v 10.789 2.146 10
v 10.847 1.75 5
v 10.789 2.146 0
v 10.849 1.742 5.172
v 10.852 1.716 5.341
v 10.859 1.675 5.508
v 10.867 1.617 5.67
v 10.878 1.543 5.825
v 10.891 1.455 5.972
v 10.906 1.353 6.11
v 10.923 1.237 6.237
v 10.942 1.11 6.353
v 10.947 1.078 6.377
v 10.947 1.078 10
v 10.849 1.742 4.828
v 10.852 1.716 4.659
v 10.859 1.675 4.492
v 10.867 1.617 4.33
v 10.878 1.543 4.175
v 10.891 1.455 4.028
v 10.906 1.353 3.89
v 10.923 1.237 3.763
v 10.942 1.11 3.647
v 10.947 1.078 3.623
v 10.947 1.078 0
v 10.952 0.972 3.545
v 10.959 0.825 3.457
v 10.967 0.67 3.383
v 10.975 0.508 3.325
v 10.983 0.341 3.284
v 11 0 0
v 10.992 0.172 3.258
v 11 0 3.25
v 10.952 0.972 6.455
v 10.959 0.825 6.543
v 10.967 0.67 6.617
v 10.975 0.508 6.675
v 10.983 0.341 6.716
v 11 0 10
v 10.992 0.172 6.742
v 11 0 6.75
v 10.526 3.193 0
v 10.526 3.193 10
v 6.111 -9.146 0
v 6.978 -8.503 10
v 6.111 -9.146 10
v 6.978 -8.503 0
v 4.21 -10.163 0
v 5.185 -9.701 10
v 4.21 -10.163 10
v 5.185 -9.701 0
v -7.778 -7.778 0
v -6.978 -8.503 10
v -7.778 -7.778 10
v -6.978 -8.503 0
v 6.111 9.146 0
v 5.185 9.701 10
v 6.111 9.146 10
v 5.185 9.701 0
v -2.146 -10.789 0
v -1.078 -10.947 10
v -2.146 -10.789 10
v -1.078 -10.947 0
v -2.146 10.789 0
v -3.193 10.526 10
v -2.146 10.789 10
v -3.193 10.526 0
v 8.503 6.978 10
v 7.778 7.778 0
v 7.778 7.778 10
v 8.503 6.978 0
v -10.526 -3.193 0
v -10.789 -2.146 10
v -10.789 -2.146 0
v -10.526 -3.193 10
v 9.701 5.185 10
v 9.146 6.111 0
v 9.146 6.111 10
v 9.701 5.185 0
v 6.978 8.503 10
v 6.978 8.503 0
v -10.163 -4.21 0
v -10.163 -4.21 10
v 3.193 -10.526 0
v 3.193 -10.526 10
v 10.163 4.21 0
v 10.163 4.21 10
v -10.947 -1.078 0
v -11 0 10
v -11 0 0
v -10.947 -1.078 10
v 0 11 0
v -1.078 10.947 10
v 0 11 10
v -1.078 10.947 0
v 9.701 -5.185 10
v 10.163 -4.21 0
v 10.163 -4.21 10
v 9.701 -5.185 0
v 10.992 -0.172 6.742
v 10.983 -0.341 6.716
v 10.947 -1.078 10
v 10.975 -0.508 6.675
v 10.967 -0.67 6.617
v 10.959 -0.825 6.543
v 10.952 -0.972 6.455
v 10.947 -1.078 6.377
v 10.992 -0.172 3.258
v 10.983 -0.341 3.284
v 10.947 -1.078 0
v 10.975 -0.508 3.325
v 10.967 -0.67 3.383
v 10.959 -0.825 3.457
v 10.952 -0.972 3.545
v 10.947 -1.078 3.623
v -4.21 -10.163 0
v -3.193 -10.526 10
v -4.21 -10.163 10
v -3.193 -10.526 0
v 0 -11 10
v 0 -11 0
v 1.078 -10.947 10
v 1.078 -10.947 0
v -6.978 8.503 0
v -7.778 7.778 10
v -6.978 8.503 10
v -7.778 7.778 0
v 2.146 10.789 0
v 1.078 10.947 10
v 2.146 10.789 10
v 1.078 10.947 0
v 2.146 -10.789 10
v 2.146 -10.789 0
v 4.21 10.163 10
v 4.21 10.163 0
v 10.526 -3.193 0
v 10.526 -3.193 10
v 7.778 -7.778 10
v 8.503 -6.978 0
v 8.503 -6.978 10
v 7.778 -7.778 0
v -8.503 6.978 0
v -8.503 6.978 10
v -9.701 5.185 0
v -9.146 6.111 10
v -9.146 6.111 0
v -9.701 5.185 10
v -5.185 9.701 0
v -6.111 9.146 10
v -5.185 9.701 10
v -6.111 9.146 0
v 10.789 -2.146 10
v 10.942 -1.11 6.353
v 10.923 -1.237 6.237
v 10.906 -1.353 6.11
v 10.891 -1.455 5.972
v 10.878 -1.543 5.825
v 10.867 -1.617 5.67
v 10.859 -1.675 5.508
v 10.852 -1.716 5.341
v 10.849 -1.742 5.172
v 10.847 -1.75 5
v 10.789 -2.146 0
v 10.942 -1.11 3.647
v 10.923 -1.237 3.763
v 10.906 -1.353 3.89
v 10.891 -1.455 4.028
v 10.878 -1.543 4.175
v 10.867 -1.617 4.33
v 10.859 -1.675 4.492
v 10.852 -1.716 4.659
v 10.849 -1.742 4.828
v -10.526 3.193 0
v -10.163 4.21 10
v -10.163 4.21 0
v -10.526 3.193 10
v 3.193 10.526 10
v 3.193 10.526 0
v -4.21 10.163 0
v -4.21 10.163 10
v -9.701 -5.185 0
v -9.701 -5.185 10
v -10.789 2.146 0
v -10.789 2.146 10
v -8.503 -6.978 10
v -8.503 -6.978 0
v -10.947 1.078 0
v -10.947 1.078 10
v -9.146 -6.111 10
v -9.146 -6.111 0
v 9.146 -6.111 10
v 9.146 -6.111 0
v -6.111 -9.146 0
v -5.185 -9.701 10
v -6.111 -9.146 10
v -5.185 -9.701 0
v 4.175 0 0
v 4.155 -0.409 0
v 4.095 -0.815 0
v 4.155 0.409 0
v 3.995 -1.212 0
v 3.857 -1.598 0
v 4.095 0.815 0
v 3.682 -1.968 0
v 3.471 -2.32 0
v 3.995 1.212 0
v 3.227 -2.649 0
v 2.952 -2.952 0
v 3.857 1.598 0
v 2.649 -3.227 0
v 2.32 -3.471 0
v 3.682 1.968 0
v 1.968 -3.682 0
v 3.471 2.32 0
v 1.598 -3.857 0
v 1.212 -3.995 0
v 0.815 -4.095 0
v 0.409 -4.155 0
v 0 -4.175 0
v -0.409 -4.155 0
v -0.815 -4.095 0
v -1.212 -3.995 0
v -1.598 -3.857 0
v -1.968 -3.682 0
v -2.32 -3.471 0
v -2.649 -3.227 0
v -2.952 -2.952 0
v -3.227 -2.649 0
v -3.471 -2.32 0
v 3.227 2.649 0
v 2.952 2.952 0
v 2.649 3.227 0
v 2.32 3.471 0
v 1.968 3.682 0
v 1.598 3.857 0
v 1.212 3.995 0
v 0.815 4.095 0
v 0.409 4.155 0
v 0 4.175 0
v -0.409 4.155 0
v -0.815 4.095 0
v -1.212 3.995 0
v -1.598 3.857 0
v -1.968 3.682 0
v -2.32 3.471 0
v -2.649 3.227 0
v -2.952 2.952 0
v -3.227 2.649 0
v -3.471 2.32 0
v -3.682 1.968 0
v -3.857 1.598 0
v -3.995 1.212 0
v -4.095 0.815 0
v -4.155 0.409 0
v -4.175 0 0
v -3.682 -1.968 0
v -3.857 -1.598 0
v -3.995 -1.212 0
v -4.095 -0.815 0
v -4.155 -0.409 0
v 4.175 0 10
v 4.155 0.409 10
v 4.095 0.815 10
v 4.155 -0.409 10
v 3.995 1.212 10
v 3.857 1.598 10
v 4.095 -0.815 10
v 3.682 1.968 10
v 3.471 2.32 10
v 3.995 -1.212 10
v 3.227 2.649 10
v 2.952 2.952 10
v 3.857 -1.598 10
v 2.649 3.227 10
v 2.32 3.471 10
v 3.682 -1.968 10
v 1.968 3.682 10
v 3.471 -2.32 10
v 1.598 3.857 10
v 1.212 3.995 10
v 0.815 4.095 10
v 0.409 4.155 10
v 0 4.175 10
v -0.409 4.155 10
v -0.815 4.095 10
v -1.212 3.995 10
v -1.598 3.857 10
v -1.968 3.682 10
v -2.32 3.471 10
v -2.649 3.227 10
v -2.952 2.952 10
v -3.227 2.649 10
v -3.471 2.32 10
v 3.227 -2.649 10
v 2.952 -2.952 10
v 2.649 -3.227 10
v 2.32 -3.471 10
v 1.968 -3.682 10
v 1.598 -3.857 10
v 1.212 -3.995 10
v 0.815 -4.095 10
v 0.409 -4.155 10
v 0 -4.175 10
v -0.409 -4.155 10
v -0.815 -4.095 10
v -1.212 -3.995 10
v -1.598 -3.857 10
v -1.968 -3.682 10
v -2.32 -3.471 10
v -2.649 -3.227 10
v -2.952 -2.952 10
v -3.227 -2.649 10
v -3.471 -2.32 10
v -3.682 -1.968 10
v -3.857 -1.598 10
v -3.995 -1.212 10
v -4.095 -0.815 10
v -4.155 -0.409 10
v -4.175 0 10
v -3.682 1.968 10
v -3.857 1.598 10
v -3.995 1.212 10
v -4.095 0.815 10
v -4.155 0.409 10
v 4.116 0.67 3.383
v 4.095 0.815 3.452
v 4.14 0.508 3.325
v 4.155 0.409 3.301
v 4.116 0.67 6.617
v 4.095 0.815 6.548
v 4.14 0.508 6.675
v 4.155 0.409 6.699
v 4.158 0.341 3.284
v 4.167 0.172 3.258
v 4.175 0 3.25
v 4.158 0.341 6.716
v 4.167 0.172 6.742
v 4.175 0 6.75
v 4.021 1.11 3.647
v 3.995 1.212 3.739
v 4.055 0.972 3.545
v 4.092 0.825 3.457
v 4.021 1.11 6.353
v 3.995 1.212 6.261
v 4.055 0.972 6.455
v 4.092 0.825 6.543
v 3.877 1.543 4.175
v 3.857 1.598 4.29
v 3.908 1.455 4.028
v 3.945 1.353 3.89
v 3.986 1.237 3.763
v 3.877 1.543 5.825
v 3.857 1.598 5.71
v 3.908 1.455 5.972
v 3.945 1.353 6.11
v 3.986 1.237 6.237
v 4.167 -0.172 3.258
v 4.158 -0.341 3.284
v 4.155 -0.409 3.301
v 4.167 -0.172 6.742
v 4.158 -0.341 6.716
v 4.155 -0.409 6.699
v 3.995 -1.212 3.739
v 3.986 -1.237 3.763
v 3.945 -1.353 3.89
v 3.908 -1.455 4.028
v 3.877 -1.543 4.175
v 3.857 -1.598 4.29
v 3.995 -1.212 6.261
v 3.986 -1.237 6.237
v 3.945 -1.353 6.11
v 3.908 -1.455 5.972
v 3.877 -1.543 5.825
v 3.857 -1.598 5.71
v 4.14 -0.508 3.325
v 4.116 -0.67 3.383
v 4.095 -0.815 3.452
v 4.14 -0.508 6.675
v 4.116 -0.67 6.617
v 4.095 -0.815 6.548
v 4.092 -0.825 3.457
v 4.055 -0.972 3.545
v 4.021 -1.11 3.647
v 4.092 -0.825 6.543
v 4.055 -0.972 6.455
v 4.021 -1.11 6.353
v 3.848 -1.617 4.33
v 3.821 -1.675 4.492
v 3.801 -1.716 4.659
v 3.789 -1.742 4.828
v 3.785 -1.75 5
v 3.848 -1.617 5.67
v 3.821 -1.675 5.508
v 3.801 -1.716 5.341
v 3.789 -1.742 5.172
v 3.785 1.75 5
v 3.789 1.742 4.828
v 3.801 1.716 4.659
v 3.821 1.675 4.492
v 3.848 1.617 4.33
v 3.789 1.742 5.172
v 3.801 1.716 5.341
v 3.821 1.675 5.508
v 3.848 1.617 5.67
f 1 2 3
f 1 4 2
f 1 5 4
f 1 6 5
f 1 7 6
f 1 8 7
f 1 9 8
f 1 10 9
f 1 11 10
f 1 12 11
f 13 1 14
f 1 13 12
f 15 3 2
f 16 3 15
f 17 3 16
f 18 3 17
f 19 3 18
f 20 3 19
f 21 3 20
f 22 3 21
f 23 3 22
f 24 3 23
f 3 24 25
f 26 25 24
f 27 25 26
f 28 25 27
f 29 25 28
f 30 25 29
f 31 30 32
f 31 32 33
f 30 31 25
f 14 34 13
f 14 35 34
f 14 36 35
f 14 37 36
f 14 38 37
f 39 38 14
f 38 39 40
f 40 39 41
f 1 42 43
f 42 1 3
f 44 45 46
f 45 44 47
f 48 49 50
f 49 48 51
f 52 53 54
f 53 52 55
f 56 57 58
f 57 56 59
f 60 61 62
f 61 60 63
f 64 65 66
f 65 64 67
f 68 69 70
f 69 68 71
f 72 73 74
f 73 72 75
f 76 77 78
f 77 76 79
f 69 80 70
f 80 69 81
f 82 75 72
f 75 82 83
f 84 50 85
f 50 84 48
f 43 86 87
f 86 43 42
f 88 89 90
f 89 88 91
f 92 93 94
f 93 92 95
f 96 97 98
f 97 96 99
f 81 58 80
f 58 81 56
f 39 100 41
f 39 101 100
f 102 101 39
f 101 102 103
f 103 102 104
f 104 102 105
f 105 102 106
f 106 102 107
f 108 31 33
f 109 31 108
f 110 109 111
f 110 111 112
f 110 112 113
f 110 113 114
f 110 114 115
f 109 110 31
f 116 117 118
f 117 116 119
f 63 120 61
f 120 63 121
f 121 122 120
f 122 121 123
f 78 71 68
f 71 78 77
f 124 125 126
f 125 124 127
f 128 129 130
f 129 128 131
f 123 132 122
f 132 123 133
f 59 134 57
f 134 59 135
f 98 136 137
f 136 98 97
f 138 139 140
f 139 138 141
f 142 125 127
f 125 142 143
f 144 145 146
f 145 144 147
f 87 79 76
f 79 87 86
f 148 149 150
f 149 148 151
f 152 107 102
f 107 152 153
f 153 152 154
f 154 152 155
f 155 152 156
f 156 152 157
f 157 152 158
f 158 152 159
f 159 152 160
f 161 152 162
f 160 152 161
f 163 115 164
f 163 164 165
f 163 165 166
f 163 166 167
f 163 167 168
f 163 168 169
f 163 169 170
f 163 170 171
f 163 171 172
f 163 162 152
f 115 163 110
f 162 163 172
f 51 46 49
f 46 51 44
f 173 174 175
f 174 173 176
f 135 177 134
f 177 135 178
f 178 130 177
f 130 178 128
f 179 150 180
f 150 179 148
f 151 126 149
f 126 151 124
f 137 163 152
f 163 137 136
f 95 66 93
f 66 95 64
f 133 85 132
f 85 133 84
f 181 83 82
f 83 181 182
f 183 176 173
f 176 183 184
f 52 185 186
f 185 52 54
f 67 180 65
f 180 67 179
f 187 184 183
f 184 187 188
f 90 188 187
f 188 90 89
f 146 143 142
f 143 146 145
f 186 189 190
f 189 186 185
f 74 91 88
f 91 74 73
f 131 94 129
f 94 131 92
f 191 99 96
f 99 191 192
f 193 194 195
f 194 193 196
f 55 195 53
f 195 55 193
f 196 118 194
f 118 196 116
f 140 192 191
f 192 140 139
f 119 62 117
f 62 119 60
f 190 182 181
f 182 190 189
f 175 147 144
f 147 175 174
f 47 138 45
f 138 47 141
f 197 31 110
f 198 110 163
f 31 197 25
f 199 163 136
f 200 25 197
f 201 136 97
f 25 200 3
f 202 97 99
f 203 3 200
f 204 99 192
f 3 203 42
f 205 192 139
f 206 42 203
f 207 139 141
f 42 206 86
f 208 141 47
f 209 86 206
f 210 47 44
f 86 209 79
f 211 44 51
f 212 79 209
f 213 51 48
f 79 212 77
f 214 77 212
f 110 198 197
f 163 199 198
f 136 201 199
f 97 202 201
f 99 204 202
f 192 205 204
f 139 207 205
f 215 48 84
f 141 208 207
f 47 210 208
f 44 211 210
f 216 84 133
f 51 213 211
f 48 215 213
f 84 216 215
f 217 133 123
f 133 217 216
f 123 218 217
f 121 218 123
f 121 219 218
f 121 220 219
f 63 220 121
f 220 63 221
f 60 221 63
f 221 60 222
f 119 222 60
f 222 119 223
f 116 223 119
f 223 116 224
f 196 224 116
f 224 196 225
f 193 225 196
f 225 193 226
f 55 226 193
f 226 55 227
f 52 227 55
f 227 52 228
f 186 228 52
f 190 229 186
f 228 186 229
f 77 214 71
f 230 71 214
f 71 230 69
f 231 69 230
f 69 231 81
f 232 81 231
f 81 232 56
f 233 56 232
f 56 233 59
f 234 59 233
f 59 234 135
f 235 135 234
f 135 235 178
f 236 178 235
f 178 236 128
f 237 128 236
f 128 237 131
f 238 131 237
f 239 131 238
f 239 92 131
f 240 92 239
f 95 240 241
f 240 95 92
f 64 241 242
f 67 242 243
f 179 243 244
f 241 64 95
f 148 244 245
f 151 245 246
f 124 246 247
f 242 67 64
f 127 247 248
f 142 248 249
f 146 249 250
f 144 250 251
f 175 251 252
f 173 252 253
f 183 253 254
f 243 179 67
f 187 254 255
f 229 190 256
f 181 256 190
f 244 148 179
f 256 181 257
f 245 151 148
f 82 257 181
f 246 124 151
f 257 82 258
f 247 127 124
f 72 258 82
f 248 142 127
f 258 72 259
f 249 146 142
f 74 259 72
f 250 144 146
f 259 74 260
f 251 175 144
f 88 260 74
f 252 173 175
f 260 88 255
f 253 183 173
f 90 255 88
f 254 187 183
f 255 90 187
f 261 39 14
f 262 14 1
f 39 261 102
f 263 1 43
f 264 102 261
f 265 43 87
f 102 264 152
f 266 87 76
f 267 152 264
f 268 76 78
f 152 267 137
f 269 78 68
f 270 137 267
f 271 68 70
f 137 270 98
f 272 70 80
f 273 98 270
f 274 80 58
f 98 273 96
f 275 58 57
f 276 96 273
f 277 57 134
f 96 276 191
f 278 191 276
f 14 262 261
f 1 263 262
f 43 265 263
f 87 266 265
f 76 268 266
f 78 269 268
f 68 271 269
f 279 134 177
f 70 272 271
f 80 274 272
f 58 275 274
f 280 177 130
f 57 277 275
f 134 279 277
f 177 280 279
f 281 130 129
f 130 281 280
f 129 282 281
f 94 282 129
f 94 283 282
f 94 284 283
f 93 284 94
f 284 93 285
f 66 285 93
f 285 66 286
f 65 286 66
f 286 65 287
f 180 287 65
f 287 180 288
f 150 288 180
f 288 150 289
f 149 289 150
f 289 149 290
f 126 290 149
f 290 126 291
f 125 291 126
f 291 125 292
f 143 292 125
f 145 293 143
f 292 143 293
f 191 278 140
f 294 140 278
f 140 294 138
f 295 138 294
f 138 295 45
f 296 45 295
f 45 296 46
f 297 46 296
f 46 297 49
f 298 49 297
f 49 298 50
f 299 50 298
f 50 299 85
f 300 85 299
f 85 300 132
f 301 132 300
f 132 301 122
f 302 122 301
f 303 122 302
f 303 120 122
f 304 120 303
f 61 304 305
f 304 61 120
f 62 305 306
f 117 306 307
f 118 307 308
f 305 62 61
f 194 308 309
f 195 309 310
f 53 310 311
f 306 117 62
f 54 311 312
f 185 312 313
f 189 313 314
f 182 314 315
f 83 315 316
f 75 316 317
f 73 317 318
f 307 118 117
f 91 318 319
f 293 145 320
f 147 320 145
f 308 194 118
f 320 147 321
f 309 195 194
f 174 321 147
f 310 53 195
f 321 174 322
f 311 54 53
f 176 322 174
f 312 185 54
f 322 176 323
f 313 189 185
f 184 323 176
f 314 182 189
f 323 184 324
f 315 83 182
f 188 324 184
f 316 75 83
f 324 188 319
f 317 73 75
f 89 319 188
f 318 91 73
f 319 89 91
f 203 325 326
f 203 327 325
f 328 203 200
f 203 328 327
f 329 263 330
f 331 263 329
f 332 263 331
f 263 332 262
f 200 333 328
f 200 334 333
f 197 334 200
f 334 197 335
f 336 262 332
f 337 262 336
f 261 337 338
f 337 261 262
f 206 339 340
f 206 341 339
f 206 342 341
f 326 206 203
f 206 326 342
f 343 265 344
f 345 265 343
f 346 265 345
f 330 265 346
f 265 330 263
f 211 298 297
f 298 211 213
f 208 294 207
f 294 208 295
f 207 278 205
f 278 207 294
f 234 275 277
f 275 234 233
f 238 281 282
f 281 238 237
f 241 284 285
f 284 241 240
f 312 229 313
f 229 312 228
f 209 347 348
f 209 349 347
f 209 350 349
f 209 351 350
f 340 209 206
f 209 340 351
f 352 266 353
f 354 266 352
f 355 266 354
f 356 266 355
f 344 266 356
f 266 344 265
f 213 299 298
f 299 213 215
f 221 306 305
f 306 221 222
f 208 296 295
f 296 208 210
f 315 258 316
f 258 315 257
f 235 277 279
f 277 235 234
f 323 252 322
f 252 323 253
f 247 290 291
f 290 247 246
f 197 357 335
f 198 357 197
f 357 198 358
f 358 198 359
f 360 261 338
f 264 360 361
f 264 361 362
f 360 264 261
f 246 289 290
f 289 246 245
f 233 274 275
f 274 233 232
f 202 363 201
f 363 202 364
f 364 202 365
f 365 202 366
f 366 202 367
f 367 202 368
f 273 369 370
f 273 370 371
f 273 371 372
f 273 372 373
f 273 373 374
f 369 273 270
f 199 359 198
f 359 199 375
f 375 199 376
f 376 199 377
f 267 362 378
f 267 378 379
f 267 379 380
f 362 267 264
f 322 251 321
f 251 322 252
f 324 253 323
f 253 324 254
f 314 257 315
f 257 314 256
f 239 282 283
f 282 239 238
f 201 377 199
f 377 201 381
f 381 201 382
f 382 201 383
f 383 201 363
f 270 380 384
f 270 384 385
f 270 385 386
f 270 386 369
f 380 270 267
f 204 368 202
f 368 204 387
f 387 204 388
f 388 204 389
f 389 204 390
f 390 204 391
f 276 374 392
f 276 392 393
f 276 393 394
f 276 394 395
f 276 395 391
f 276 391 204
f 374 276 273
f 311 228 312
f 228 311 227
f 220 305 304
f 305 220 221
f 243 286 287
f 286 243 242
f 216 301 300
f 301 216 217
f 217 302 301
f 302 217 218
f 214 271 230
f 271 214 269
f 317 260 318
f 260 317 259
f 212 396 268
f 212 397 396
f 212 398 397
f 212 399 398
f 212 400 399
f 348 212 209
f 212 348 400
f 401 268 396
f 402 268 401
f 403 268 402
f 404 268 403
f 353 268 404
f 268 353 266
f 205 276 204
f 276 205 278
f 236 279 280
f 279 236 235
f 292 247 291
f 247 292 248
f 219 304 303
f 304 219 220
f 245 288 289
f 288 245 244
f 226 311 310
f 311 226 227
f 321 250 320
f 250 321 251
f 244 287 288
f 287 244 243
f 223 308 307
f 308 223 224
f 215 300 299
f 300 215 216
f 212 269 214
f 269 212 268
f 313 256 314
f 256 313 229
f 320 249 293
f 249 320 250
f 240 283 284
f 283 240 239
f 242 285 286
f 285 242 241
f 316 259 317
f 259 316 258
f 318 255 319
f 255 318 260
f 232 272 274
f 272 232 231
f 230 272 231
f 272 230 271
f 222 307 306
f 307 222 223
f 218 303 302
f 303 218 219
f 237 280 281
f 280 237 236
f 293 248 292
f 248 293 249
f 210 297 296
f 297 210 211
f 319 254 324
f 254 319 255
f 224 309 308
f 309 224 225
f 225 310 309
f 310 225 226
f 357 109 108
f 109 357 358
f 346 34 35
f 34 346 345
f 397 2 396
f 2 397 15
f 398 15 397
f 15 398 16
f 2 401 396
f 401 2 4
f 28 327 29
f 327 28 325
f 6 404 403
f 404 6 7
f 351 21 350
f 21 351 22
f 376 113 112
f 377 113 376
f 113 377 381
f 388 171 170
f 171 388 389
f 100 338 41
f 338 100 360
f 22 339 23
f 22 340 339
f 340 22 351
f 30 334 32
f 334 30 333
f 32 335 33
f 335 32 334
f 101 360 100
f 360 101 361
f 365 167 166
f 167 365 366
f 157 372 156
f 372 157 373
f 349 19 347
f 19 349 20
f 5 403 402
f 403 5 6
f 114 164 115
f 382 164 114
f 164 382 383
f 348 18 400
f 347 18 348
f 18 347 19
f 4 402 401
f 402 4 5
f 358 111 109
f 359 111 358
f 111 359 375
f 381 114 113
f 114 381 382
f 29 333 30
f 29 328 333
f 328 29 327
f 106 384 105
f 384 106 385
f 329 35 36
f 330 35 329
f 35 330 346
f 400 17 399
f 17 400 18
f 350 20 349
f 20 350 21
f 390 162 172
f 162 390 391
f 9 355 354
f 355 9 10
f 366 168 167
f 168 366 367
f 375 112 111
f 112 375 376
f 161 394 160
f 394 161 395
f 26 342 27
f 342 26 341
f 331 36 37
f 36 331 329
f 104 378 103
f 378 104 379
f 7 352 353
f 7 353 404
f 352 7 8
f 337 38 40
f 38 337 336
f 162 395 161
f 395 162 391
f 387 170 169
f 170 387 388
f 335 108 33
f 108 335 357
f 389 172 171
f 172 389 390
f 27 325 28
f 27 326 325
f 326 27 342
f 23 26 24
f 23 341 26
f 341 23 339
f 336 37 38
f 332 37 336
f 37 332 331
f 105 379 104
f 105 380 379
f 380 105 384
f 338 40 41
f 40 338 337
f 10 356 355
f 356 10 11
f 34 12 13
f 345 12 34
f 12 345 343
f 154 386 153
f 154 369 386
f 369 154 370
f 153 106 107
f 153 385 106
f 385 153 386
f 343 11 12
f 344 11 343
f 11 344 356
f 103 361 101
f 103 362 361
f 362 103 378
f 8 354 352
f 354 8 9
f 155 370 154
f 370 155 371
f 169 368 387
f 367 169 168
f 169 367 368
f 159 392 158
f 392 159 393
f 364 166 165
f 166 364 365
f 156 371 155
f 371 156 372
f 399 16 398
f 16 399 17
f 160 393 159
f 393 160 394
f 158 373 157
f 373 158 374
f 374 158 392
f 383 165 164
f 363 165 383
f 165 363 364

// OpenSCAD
// file: parameters.scad
// =============================================================================
// Gen-M Dual-stator sandwich AFPM — WOUND-AWARE parameters (HARD GATE)
// Evolution of withdrawn Gen-J. Magnet face ↔ WOUND coil face ≥ 0.8 mm.
// =============================================================================

// --- Wire / wind budget (26 AWG, ~1 lb spool) ---------------------------------
wire_awg            = 26;
wire_od             = 0.45;     // insulated OD mm (audit assumption)
turns               = 120;      // design turns per pancake
fill                = 0.70;     // packing factor for build estimate
layers_per_face     = 3;        // axial layers budgeted proud of EACH flange
wind_build_axial    = layers_per_face * wire_od * fill;   // 3*0.45*0.7 = 0.945 mm
wind_build_radial   = 2 * wire_od * fill;                 // ~0.63 mm radial overfill budget

// --- Pancake former (bare STL) -----------------------------------------------
coil_id_r           = 24.0;
coil_od_r           = 56.0;
span_deg            = 34.0;     // 9 stations × 40° pitch, 34° copper span
former_web          = 3.2;      // core / web between flanges
flange_t            = 1.0;
wall                = 1.2;      // ≥0.8; load wall 1.2
slot_w              = 2.4;
mount_hole          = 3.5;      // M3 clear
tab_len             = 7.0;

former_bare_h       = former_web + 2 * flange_t;          // 5.2 mm
coil_envelope_h     = former_bare_h + 2 * wind_build_axial; // 7.09 mm

// --- Running clearance (magnet face → WOUND face) ----------------------------
run_clear           = 0.85;     // ≥ 0.8 mm after stated wind
// Front wind stands proud of stator face by wind_build_axial when bay seats
// bare former + back-face copper. Spacer sets magnet → stator face:
gap_spacer_h        = run_clear + wind_build_axial;       // 1.795 ≈ 1.80 mm
// ⇒ magnet_to_wound = gap_spacer_h - wind_build_axial = run_clear = 0.85 mm PASS

// --- Stator bay (sized to WOUND radial + axial, not bare former) -------------
coil_stations       = 9;        // 9+9; document if 12+12 won't one-plate
bay_r_in            = coil_id_r - 2.0 - wind_build_radial;  // ~21.37
bay_r_out           = coil_od_r + 2.0 + wind_build_radial;  // ~58.63
bay_span            = span_deg + 4.0;                       // circumferential clear
bay_offset          = 2.0;      // extra pocket clearance beyond wound outline
// Seat bare former + back wind; front wind proud of stator face
bay_depth           = former_bare_h + wind_build_axial;     // 6.145 mm
stator_back_web     = 2.5;
stator_thick        = bay_depth + stator_back_web;          // ~8.65 mm
stator_od           = 152.0;
shaft_clear_stator  = 40.0;
coil_mount_r        = 32.0;

// --- Rotor (dual-face Halbach) -----------------------------------------------
large_pocket_d      = 20.3;
small_pocket_d      = 5.3;
pocket_h            = 5.2;
large_n             = 8;
R_large             = 52.0;
R_small             = [40.0, 52.0, 64.0];
carrier_od          = 148.0;
carrier_thick       = 12.0;     // 5.2 + 1.6 web + 5.2
hub_h               = 10.0;
hub_od              = 30.0;

// --- Modular MAX interface ---------------------------------------------------
shaft_bore          = 8.35;
bearing_d           = 21.85;
bearing_h           = 7.2;
m3_clear            = 3.5;
bolt_r_inner        = 36.0;
bolt_n_inner        = 6;
outer_bolt_r        = 70.0;
outer_bolt_n        = 6;
flange_bolt_r       = 72.0;     // Gen-E family
flange_bolt_n       = 6;
brace_r             = 68.0;
brace_d             = 4.3;
brace_n             = 4;

// --- Gap spacer pad ----------------------------------------------------------
spacer_pad_od       = 14.0;
spacer_pad_id       = m3_clear;

// --- Endbell -----------------------------------------------------------------
endbell_od          = 152.0;
endbell_thick       = 8.0;
endbell_shaft_clear = 10.0;

$fn = 64;
// main file
// Gen-M shaft collar — print ×2–4
include <parameters.scad>;
$fn = 64;
od = 22; id = shaft_bore; h = 10; set_d = 3.5;
difference() {
    cylinder(d=od, h=h);
    translate([0, 0, -0.1]) cylinder(d=id, h=h + 0.2);
    translate([0, 0, h/2]) rotate([0, 90, 0]) cylinder(d=set_d, h=od);
}
